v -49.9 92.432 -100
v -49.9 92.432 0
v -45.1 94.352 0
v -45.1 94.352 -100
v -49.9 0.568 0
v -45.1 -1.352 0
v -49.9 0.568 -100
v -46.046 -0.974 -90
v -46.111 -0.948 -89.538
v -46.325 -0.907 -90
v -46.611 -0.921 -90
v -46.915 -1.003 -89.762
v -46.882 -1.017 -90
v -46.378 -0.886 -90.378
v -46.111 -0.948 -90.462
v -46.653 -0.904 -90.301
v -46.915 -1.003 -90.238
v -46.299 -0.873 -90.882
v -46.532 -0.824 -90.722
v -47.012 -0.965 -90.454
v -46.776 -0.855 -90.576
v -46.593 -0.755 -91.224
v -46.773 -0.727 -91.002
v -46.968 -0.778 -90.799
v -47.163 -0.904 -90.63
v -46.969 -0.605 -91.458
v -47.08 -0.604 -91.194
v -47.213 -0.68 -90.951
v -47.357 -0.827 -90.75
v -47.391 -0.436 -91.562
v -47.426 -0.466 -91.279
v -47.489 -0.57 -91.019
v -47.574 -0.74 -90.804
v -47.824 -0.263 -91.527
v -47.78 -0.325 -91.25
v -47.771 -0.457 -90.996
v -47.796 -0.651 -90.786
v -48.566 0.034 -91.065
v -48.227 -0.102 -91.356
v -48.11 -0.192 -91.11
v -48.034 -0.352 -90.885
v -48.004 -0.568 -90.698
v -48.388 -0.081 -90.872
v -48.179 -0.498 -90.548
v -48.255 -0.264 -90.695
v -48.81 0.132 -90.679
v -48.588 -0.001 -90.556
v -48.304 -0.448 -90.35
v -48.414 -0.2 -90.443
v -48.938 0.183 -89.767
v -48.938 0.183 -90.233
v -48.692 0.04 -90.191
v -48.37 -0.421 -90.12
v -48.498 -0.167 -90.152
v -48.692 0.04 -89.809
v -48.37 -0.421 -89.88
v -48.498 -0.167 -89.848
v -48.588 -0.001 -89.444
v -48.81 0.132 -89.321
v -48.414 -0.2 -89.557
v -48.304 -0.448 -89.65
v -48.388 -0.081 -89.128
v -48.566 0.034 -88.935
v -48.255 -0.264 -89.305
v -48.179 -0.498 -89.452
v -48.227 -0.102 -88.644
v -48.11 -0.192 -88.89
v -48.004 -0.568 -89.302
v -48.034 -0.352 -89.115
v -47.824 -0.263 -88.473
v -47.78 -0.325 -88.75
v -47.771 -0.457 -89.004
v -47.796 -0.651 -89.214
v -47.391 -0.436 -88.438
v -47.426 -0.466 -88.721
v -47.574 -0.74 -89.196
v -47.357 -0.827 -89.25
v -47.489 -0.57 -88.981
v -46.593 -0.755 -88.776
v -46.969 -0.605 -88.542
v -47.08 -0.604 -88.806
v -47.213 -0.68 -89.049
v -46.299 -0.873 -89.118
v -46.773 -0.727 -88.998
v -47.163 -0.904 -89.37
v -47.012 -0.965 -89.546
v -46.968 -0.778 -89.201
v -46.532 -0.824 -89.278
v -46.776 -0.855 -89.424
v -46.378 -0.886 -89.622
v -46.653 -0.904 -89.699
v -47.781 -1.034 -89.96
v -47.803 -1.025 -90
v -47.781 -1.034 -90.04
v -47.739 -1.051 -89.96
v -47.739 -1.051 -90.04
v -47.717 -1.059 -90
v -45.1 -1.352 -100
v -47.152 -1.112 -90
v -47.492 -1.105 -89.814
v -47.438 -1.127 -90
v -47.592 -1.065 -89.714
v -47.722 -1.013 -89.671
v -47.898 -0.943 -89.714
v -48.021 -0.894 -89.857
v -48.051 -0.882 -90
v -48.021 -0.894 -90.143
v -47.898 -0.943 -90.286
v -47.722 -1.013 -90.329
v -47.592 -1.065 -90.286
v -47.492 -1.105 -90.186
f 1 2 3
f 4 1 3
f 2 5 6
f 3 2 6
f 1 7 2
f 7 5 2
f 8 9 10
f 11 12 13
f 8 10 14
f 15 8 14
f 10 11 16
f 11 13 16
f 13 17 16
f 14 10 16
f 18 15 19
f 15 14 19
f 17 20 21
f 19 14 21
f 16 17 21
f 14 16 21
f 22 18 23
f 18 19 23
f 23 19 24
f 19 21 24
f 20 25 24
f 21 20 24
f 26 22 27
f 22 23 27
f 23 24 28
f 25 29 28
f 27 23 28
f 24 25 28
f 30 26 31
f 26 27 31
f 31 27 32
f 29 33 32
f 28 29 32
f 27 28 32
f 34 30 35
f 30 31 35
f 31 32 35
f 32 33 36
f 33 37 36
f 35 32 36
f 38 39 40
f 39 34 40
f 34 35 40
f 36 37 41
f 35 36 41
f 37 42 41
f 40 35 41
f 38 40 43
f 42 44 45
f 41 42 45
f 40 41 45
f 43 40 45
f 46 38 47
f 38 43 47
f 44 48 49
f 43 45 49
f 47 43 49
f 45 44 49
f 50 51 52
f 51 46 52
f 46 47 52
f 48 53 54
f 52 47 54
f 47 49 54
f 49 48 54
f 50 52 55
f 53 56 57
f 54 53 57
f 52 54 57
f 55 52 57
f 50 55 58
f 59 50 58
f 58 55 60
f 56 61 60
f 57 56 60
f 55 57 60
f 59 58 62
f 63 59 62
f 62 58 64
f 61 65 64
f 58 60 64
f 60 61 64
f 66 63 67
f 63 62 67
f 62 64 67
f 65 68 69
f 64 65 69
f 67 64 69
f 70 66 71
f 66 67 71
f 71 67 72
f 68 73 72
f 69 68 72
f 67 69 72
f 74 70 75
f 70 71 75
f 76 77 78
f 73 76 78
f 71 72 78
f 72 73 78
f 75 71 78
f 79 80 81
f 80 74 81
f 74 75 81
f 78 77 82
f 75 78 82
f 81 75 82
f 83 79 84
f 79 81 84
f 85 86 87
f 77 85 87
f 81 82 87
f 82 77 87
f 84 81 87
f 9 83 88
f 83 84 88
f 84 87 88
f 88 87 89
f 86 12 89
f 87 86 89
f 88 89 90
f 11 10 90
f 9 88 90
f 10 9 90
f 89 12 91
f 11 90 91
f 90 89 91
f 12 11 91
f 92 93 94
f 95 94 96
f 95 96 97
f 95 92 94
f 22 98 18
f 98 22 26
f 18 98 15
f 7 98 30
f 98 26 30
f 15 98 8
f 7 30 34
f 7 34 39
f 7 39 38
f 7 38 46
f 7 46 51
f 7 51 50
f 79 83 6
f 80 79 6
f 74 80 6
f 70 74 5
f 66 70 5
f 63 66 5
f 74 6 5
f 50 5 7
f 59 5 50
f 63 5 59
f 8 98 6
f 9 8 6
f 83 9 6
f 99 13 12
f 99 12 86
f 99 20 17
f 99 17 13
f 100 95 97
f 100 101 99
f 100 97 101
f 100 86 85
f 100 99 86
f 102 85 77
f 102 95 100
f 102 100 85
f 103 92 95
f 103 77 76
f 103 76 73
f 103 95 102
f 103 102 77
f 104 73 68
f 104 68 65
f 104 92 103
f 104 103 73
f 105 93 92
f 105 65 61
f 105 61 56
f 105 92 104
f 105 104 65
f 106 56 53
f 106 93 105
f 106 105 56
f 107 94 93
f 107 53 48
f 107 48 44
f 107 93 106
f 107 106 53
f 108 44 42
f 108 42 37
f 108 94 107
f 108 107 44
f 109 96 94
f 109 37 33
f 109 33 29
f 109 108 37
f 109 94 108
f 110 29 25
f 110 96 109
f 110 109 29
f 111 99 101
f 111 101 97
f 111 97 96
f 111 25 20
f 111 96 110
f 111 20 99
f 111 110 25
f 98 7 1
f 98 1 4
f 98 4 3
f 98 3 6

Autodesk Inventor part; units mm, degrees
ref_plane "YZ Plane" through (0, 0, 0) normal (1, 0, 0) x (0, 1, 0)
ref_plane "XZ Plane" through (0, 0, 0) normal (0, 1, 0) x (-1, 0, 0)
ref_plane "XY Plane" through (0, 0, 0) normal (0, 0, 1) x (1, 0, 0)
sketch "Sketch1" plane through (0, 0, 0) normal (0, 0, 1) x (1, 0, 0)
  line L0 (44.8, 3.5) -> (44.8, 89.5) construction
  line L1 (-45, 89.5) -> (44.8, 89.5) construction
  line L2 (-45, 94.5) -> (-45, 89.5) construction
  line L3 (-50, 92.5) -> (-45, 94.5) construction
  line L4 (-50, 0.5) -> (-50, 92.5) construction
  line L5 (-45, -1.5) -> (-50, 0.5) construction
  line L6 (-45, 3.5) -> (-45, -1.5) construction
  line L7 (44.8, 3.5) -> (-45, 3.5) construction
  line L8 (-49.9, 92.4323) -> (-45.1, 94.3523)
  line L9 (-45.1, 94.3523) -> (-45.1, 89.4)
  line L10 (-45.1, 89.4) -> (44.7, 89.4) construction
  line L11 (44.7, 89.4) -> (44.7, 3.6) construction
  line L12 (44.7, 3.6) -> (-45.1, 3.6) construction
  line L13 (-45.1, 3.6) -> (-45.1, -1.3523)
  line L14 (-45.1, -1.3523) -> (-49.9, 0.5677)
  line L15 (-49.9, 0.5677) -> (-49.9, 92.4323)
  line L16 (-45.1, 89.4) -> (-45.1, 3.6)
  point P0 (0, 0)
  dimension "d0" = 0.1
extrude "Extrusion1" add sketch "Sketch1" against normal blind 100
sketch "Sketch2" plane through (-49.9, 0.5677, -100) normal (-0.3713907, -0.9284767, 0) x (0.9284767, -0.3713907, 0)
  circle A0 centre (2.5849, 10) radius 1
  line L0 (5.1698, 0) -> (0, 0) projected
  line L1 (2.5849, 0) -> (2.5849, 10) construction
  point P0 (46.5418, 100)
  dimension "d3" = 2
  dimension "d4" = 10
extrude "Extrusion2" add sketch "Sketch2" along normal blind 0.7
fillet "Fillet1" radius 1 2 edges at (-48.6885, -0.6708, -90) (-48.4285, -0.0209, -90)
properties part number "door2" material "ABS Plastic"
